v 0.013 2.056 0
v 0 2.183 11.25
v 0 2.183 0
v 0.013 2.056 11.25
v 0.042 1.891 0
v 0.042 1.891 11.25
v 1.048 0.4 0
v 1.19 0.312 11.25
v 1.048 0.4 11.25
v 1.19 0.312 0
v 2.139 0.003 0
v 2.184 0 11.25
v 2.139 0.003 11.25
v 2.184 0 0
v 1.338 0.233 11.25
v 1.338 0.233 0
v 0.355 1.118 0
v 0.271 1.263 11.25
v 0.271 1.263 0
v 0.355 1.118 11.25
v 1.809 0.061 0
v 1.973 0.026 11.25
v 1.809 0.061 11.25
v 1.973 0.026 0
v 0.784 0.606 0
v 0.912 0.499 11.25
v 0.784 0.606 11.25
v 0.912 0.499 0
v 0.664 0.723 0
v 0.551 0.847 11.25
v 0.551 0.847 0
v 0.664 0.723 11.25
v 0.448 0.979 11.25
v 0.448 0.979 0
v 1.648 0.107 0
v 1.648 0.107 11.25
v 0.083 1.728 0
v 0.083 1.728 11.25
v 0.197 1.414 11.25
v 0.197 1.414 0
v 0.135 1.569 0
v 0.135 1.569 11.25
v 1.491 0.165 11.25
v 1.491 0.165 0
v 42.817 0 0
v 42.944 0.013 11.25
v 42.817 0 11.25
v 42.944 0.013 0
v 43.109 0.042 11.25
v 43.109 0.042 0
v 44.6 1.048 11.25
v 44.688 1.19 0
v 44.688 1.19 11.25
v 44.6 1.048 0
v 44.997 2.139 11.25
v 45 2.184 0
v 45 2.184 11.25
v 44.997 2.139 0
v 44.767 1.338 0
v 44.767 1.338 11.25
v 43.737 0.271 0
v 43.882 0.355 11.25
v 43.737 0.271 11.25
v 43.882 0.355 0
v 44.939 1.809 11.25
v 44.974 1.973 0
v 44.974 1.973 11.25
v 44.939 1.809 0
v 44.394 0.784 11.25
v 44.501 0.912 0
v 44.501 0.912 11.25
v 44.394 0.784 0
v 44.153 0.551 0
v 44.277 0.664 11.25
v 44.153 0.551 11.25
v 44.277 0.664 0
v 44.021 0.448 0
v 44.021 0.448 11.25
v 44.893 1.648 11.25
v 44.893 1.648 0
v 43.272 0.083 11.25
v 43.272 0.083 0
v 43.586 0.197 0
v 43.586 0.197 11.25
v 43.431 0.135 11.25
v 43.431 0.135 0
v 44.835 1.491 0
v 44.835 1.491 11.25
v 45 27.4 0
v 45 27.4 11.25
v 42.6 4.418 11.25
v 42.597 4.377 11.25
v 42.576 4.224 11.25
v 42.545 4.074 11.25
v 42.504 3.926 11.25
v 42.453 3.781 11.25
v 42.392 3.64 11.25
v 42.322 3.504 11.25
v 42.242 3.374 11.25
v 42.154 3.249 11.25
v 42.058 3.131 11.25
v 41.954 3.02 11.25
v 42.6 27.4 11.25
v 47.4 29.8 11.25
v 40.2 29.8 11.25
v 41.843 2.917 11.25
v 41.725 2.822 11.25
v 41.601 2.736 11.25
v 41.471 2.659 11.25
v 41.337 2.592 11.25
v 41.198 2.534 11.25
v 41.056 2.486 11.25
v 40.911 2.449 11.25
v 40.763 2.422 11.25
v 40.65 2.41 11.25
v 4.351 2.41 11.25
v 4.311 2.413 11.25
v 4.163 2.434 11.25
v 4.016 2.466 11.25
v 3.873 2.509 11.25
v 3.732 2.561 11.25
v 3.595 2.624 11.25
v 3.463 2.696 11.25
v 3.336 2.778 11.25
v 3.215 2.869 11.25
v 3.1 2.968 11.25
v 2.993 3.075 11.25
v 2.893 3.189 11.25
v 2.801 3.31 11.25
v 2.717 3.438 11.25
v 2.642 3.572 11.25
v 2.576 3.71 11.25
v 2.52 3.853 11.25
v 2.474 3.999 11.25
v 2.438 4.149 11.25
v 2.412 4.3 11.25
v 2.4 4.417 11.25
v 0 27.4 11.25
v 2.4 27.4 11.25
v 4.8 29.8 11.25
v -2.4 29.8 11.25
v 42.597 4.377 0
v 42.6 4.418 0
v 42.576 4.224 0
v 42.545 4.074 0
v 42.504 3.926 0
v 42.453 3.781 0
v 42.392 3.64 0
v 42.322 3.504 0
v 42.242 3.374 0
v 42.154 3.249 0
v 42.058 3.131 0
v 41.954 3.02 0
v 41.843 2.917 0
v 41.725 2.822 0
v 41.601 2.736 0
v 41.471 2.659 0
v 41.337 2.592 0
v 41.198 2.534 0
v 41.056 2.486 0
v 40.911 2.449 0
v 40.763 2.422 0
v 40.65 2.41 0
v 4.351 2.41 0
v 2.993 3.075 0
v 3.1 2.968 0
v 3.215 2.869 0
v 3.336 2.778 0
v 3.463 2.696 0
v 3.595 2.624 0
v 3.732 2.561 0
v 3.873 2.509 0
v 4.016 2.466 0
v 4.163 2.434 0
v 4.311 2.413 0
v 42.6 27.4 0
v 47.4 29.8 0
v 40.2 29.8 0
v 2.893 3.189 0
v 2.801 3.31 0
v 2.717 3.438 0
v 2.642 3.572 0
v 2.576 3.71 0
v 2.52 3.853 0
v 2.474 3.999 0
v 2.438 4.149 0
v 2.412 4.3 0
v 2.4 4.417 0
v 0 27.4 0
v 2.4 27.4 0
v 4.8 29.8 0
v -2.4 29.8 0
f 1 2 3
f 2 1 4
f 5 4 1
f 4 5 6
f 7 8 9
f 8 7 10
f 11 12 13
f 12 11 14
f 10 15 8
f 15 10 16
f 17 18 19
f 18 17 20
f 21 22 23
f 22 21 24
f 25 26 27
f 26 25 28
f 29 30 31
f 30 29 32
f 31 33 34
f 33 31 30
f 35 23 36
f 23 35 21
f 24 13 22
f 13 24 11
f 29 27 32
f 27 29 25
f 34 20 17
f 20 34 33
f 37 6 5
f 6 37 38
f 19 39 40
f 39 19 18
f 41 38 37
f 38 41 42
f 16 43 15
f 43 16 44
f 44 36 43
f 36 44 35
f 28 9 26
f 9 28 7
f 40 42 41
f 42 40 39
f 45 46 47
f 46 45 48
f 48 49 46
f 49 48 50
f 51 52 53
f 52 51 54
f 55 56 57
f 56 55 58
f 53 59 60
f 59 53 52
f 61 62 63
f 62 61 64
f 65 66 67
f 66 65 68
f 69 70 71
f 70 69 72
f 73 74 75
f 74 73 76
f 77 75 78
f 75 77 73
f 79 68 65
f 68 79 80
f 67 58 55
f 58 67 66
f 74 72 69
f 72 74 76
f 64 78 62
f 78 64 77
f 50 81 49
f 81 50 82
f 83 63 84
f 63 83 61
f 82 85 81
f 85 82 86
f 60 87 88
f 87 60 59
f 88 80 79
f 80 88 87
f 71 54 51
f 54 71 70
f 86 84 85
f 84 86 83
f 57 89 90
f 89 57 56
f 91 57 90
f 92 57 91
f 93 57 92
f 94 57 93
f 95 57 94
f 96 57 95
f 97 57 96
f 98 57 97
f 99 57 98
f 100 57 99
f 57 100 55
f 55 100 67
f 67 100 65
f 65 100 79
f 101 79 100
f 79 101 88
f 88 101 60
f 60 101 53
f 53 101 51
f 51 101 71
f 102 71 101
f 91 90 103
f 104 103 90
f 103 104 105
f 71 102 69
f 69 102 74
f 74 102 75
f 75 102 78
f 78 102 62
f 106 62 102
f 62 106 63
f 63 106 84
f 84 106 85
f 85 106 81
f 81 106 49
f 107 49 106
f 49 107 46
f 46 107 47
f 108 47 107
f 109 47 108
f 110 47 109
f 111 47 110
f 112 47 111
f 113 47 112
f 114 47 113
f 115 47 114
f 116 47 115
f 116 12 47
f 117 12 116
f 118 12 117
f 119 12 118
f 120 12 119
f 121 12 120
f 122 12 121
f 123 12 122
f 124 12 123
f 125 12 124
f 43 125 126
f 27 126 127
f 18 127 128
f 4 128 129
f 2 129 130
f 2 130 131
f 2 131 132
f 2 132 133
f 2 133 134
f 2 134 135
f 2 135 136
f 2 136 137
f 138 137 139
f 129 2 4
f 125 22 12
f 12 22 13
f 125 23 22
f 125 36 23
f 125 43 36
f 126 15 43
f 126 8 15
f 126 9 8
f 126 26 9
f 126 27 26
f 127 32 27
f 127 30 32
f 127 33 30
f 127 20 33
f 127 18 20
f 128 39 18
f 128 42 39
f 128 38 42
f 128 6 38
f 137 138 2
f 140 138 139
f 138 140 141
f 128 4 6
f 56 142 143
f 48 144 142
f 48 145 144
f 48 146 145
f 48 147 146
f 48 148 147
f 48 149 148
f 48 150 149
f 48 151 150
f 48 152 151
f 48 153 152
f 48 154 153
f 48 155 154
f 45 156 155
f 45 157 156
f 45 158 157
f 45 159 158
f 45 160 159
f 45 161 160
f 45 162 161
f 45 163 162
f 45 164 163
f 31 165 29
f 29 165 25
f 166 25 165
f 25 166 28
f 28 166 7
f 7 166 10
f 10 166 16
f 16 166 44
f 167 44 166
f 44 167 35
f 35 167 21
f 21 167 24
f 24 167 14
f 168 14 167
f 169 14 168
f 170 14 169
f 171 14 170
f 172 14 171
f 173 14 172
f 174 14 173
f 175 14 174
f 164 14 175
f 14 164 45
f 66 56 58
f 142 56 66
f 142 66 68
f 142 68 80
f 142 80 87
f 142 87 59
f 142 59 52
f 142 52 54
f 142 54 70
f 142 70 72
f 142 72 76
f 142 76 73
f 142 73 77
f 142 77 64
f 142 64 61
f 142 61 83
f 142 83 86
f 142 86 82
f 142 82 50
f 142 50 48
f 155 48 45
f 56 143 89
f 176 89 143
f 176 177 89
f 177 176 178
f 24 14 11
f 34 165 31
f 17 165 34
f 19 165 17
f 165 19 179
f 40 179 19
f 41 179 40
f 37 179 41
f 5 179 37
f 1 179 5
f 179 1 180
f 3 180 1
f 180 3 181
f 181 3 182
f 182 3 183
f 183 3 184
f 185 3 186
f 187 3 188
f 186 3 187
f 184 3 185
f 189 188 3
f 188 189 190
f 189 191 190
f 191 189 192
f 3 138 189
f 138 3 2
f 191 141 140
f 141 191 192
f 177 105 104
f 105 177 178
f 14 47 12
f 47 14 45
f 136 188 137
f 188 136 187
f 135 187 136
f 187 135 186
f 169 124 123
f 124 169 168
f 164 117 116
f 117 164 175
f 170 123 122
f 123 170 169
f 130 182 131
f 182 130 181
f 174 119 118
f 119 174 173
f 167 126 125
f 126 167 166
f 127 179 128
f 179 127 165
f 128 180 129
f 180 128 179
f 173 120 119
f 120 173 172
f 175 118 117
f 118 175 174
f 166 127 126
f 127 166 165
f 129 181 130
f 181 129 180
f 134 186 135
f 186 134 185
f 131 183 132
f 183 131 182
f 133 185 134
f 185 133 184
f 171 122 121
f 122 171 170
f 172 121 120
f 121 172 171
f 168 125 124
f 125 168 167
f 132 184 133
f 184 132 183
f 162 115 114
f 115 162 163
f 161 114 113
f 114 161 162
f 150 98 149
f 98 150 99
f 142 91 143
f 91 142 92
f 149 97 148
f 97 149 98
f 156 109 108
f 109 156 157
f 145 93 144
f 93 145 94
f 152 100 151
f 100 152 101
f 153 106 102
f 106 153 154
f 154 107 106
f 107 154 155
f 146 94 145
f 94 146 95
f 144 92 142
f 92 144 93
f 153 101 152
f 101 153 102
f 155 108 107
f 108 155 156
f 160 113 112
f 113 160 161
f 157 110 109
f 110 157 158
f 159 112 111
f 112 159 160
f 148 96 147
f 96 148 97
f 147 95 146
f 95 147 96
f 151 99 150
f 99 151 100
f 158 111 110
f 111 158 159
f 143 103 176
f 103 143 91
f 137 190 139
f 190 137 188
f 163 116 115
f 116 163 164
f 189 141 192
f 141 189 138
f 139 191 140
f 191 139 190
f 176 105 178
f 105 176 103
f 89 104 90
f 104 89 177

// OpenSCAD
// file: ../../modules/fillet.scad
module fillet(r, l) {
  difference() {
    cube([r, r, l]);
    translate([0, 0, -.1]) cylinder(h = l + .2, r = r);
  }
}
// file: ../../modules/dovetail.scad
module dovetail(l1, l2, h, d) {
  polyhedron([
    [l1 / -2, 0, 0],
    [l1 / 2, 0, 0],
    [l2 / 2, 0, h],
    [l2 / -2, 0, h],
    [l1 / -2, d, 0],
    [l1 / 2, d, 0],
    [l2 / 2, d, h],
    [l2 / -2, d, h]
  ], [
    [0, 3, 2, 1],
    [4, 5, 6, 7],
    [1, 2, 6, 5],
    [2, 3, 7, 6],
    [0, 4, 7, 3],
    [0, 1, 5, 4]
  ]);
}
// file: ../../modules/chamferedScrew.scad
module chamferedScrewHole(rh, rs, d, ds, t = .1) {
  translate([0, 0, -t]) cylinder(r=rs, h=d + t);
  translate([0, 0, d - ds + t]) cylinder(r1=rs, r2=rh, h=ds + t);
}
// file: _common.scad
include <../../modules/chamferedScrew.scad>
include <../../modules/dovetail.scad>
include <../../modules/fillet.scad>


$fa=4; // default minimum facet angle is now 0.5
$fs=0.05; // default minimum facet size is now 0.05 mm

length = 75;

anchorWidth = 15;

wallThickness = 2.4;

loopInnerDepth = 25;
loopDepth = loopInnerDepth + wallThickness * 2;
loopWidth = anchorWidth * 3/4;
loopLength = length - anchorWidth * 2;

screwHoleDiam = 4.75;
countersinkDiam = 9;

tolerance = .1;
// main file
include <_common.scad>

difference() {
  baseShape();
  translate([wallThickness, wallThickness + 0.01, -.1]) resize([loopLength - wallThickness * 2, loopDepth - wallThickness, loopWidth + .2]) baseShape();
}

translate([wallThickness / 2, loopDepth, 0]) rotate([90, 0, 0]) dovetail(wallThickness * 3, wallThickness, wallThickness, loopWidth);
translate([loopLength - wallThickness / 2, loopDepth, 0]) rotate([90, 0, 0]) dovetail(wallThickness * 3, wallThickness, wallThickness, loopWidth);

module baseShape() {
  difference() {
    cube([loopLength, loopDepth, loopWidth]);
    translate([wallThickness - 0.01, wallThickness - 0.01, -0.1]) rotate([0, 0, 180]) fillet(r = wallThickness, l = loopWidth + 0.2);
    translate([loopLength - wallThickness + 0.01, wallThickness - 0.01, -0.1]) rotate([0, 0, -90]) fillet(r = wallThickness, l = loopWidth + 0.2);
  }
}
